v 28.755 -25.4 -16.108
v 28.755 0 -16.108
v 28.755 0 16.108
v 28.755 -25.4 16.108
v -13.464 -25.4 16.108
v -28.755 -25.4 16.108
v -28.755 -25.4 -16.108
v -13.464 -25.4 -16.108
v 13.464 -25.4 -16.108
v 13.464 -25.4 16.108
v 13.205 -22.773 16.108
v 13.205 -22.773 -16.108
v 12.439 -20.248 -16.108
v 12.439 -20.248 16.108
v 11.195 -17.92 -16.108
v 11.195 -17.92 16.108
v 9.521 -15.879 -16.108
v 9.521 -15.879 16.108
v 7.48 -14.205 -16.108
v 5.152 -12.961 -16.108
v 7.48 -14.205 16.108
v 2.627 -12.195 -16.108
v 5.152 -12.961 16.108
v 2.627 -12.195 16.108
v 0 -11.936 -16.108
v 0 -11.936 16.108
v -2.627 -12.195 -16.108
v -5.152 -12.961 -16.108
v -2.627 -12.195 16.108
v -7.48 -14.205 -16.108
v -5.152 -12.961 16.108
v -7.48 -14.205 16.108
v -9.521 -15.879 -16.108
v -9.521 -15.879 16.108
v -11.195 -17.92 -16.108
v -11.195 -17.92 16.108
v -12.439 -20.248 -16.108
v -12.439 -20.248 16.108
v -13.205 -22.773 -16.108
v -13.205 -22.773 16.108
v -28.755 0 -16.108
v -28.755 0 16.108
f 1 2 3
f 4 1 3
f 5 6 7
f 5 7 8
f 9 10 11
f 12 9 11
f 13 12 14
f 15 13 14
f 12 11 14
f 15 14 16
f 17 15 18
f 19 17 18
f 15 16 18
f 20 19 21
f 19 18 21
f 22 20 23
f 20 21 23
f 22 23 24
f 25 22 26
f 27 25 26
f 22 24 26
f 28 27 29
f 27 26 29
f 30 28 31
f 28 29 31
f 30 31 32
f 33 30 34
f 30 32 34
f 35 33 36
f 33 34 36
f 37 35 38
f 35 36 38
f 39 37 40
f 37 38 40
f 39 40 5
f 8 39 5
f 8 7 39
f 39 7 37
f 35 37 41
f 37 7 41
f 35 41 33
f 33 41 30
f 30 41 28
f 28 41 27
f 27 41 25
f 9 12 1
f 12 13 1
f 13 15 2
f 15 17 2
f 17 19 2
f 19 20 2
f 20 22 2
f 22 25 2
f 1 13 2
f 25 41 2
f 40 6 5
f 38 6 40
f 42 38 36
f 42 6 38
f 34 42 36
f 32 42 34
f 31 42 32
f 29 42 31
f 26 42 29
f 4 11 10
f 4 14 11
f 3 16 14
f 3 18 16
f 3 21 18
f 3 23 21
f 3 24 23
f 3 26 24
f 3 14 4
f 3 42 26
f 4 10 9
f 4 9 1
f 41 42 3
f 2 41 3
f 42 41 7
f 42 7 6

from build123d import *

# Parameters (mm, degrees)
F0_W     = 57.50962
F0_H     = 32.216034
F1_DEPTH = 25.4
F3_DEPTH = 32.217035


with BuildPart() as f1:
    # F0 (on Front) → F1 (new body)
    with BuildSketch(Plane.XZ):
        Rectangle(F0_W, F0_H)
    extrude(amount=F1_DEPTH)

    # F2 (on face) → F3 (cut, through all)
    with BuildSketch(Plane.XY.offset(16.108017)):
        with BuildLine():
            Line((-13.464067, -25.4), (13.464067, -25.4))
            ThreePointArc((13.464067, -25.4), (0, -11.935933), (-13.464067, -25.4))
        make_face()
    extrude(amount=-F3_DEPTH, mode=Mode.SUBTRACT)


solid = f1.part
